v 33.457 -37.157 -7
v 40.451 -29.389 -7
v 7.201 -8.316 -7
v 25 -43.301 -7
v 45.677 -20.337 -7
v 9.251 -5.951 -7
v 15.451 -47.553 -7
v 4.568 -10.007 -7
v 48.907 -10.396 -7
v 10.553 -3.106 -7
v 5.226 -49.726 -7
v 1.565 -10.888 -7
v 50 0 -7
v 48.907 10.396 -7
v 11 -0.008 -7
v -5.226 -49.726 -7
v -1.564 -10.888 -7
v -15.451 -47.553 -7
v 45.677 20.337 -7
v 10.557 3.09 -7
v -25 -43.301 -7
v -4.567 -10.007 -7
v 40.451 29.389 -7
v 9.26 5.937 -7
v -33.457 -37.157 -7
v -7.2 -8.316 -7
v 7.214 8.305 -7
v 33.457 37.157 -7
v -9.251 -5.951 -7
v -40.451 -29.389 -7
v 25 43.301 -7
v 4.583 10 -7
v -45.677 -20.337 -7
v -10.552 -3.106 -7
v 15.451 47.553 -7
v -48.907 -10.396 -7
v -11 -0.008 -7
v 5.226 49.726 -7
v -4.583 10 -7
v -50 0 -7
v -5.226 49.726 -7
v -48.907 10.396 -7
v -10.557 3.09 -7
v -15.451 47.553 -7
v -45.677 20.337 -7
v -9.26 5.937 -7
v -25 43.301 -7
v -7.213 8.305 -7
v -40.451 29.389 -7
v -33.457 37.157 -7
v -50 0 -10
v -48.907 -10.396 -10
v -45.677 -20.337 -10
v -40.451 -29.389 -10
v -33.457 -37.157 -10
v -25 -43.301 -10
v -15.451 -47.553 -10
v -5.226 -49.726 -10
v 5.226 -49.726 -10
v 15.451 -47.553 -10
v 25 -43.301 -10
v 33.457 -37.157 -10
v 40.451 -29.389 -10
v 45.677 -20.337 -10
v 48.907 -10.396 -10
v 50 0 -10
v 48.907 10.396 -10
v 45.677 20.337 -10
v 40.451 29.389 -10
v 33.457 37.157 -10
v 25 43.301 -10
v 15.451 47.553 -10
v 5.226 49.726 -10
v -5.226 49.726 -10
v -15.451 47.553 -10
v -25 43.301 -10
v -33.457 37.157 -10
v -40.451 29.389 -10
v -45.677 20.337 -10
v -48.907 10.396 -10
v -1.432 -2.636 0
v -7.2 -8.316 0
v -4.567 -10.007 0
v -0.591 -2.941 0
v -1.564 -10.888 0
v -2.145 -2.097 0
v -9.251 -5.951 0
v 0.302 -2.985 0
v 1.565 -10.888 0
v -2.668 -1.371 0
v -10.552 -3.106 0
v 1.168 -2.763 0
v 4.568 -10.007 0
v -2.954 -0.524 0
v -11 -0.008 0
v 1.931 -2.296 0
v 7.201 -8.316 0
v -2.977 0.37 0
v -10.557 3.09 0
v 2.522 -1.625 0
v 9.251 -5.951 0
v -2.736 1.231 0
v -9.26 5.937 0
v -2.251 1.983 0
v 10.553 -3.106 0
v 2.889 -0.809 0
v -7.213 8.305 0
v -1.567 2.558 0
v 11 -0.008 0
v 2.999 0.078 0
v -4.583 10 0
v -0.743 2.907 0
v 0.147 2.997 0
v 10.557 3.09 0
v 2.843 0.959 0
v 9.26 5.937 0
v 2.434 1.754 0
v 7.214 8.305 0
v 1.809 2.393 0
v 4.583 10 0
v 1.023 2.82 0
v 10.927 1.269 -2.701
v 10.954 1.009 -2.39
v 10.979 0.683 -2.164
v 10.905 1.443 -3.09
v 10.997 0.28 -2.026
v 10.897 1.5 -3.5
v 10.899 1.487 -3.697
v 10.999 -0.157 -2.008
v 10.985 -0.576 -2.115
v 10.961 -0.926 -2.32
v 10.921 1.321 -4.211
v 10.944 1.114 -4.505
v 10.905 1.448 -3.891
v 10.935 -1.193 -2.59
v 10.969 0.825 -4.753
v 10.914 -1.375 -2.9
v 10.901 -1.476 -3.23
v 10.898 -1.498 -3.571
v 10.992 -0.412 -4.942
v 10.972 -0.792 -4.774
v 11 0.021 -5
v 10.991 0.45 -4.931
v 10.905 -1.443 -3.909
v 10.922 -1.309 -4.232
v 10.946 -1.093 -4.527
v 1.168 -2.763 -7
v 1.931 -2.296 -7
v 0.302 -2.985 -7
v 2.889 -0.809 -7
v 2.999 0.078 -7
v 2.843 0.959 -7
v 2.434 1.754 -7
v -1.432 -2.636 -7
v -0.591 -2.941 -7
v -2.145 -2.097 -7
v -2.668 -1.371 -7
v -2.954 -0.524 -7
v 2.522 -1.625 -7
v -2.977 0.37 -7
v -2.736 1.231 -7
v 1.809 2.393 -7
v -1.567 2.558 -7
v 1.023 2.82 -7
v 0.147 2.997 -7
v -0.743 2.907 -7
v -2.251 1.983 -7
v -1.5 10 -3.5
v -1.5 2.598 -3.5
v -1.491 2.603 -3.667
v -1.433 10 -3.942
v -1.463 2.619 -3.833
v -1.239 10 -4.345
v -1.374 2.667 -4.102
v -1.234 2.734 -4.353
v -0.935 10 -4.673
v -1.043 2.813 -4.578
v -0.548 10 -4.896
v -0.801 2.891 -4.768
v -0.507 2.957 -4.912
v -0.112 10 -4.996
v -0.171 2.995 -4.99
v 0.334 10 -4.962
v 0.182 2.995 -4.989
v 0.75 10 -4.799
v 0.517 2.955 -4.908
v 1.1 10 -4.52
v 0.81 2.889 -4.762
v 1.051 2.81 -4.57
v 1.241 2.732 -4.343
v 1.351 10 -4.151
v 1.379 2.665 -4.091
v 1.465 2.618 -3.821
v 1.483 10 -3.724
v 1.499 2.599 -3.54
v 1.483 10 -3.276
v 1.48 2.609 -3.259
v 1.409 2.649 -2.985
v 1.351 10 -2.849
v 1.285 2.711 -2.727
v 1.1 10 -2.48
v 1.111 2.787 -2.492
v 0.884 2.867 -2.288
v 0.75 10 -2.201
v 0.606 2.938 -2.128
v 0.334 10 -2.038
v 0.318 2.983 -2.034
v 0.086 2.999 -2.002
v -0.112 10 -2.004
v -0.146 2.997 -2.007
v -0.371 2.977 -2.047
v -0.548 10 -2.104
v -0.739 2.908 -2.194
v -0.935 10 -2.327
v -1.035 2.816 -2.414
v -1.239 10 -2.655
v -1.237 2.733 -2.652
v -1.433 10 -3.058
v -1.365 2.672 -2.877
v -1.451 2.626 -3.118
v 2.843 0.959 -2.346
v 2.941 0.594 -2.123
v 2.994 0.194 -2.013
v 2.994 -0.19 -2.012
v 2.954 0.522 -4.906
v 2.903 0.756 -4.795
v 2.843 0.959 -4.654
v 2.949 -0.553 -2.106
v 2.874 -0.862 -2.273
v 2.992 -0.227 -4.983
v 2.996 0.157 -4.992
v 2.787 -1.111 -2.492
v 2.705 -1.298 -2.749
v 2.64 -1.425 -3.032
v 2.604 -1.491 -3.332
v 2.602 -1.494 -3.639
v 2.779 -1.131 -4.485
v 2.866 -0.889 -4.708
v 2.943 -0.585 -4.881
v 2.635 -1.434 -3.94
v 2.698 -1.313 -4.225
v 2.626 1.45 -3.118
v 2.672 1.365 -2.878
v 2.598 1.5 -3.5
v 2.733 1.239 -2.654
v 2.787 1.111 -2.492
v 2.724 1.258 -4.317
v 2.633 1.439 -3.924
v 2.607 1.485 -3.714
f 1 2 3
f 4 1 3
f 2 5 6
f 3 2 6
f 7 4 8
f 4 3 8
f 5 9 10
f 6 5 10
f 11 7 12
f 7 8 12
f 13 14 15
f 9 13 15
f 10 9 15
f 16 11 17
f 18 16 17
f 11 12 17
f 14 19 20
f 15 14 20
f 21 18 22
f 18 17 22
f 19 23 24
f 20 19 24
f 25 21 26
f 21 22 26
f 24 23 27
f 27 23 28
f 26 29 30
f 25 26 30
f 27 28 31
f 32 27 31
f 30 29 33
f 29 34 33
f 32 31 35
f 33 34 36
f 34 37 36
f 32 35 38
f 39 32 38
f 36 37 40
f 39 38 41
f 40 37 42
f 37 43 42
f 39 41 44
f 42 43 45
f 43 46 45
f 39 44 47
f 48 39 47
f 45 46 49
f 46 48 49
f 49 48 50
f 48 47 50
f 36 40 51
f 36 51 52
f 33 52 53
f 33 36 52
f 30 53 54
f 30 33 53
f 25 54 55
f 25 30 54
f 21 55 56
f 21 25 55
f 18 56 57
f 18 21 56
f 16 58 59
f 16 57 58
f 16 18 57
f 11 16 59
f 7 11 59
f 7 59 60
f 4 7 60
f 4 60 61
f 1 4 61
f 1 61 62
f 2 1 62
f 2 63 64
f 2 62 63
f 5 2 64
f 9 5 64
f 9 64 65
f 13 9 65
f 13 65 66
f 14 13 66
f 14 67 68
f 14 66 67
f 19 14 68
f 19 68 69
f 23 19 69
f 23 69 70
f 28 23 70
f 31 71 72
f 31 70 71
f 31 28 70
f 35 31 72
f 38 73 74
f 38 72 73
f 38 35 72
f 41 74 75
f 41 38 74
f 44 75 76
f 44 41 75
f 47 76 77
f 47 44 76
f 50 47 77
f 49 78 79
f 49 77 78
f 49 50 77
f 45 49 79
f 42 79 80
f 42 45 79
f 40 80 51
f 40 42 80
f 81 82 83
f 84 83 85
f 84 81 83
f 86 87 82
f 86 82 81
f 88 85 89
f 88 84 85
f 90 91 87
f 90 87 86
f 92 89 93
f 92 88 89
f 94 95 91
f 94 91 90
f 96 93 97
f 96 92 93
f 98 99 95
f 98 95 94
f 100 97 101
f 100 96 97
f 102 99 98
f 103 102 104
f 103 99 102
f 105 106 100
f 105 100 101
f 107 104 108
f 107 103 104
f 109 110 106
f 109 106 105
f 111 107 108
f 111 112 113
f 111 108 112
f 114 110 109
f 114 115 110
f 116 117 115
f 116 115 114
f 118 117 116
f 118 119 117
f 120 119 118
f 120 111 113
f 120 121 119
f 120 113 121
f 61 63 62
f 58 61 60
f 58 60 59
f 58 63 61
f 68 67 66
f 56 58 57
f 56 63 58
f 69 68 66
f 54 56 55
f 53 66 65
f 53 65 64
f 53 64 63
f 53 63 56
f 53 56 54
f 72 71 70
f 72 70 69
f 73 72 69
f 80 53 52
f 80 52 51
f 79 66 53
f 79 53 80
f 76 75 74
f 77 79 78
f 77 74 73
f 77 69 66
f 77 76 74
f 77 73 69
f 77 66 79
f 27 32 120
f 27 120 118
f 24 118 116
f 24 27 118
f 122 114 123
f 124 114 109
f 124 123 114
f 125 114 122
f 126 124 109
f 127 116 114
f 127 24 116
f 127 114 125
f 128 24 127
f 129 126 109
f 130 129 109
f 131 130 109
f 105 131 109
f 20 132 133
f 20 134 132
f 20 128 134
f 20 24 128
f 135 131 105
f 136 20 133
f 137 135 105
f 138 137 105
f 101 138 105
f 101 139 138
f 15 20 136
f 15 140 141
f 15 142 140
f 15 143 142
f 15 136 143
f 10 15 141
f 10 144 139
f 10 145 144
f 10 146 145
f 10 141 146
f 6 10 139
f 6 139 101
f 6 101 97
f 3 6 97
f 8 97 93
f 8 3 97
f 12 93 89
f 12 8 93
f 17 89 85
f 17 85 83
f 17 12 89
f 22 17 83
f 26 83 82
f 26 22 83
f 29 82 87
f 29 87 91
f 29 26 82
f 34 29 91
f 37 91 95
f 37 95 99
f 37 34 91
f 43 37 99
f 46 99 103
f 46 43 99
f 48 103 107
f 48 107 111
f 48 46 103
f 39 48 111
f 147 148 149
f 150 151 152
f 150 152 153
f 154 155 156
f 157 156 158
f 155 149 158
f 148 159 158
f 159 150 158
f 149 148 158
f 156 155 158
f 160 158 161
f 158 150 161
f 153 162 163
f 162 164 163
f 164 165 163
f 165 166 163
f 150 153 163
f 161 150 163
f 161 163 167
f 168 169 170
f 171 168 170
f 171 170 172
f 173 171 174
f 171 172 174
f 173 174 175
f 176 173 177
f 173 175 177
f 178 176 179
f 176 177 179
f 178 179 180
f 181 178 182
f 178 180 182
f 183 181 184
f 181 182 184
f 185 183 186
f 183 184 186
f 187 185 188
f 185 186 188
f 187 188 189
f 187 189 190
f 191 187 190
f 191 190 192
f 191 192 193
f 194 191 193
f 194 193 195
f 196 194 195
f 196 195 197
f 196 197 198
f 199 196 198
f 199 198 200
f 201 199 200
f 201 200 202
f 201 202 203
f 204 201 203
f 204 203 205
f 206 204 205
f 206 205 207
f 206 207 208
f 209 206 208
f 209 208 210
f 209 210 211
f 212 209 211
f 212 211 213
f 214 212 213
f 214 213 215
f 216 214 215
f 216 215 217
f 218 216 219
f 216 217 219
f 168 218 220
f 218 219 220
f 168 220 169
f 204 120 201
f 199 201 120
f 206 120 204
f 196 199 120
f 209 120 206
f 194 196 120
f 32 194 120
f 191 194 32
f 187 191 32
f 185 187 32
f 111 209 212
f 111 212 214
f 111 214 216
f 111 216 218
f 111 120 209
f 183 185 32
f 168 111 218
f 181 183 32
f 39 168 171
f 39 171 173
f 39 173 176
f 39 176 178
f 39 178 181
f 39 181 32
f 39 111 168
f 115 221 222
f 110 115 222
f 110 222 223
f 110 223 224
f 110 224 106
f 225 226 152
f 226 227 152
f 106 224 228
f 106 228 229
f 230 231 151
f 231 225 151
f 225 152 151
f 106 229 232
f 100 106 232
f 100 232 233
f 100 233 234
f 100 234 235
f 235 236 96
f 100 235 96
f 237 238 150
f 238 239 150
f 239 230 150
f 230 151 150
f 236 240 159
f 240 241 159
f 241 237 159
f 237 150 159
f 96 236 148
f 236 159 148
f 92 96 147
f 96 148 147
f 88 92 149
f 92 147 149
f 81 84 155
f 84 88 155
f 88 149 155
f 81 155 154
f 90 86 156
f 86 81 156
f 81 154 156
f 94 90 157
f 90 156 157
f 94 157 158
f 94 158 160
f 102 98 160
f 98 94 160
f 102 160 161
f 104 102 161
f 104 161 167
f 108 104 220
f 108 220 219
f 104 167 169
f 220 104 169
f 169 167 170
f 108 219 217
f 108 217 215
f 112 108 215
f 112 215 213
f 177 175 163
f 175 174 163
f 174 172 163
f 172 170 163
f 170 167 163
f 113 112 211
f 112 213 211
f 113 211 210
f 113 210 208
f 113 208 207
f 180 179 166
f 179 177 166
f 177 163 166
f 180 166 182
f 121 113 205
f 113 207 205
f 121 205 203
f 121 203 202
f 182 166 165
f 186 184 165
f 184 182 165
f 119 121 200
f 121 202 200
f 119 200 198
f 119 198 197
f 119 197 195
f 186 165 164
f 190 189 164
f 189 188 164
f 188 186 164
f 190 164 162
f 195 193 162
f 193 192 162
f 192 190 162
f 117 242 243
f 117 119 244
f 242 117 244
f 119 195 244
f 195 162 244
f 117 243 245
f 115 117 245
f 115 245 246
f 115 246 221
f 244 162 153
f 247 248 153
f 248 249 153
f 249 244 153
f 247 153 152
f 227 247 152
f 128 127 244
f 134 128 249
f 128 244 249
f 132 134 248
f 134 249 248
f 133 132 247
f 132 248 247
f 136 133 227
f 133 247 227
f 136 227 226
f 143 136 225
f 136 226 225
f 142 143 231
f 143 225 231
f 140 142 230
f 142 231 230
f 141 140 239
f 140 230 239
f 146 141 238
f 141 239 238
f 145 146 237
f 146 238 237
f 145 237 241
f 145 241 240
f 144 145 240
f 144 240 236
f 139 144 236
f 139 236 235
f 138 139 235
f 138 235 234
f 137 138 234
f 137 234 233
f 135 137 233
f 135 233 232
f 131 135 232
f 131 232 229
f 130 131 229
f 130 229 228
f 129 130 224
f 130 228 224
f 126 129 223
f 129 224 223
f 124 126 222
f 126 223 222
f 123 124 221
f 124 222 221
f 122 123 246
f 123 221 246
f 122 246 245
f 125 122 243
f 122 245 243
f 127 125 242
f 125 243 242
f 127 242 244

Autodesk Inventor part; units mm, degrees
ref_plane "YZ Plane" through (0, 0, 0) normal (1, 0, 0) x (0, 1, 0)
ref_plane "XZ Plane" through (0, 0, 0) normal (0, 1, 0) x (-1, 0, 0)
ref_plane "XY Plane" through (0, 0, 0) normal (0, 0, 1) x (1, 0, 0)
sketch "Sketch1" plane through (0, 0, 0) normal (0, 0, 1) x (1, 0, 0)
  spline S0 degree 3 poles (-8.9262, 55.5372) (-8.7839, 55.3802) (-8.4991, 55.0662) (-8.0852, 54.5835) (-7.6813, 54.0924) (-7.2889, 53.592) (-6.9084, 53.0826) (-6.5406, 52.5638) (-6.1865, 52.0357) (-5.8469, 51.4981) (-5.5231, 50.9508) (-5.2164, 50.3937) (-4.9286, 49.8267) (-4.6617, 49.2495) (-4.4187, 48.6617) (-4.2033, 48.0633) (-4.0539, 47.5547) (-3.9553, 47.1422) (-3.9241, 46.9325) (-3.9085, 46.8277) knots 0 0 0 0 0.063581 0.127162 0.190743 0.254324 0.317905 0.381486 0.445066 0.508647 0.572227 0.635807 0.699386 0.762964 0.826542 0.890117 0.953687 0.985476 1.017256 1.017256 1.017256 1.017256
  spline S1 degree 3 poles (-3.9085, 46.8277) (-3.8988, 46.6849) (-3.8795, 46.3993) (-3.8286, 45.9728) (-3.7545, 45.5498) (-3.6583, 45.1311) (-3.5319, 44.7205) (-3.3763, 44.3201) (-3.189, 43.9333) (-2.9645, 43.5666) (-2.7433, 43.2845) (-2.5493, 43.0739) (-2.3922, 42.9274) (-2.2262, 42.7911) (-2.0526, 42.6646) (-1.8686, 42.5537) (-1.678, 42.4548) (-1.4812, 42.3683) (-1.2769, 42.302) (-1.0697, 42.2449) (-0.8577, 42.21) (-0.6441, 42.187) (-0.3577, 42.1846) (0, 42.1894) (0.3577, 42.1846) (0.6441, 42.187) (0.8577, 42.21) (1.0697, 42.2449) (1.2769, 42.302) (1.4812, 42.3683) (1.678, 42.4548) (1.8686, 42.5537) (2.0526, 42.6646) (2.2262, 42.7911) (2.3922, 42.9274) (2.5493, 43.0739) (2.7433, 43.2845) (2.9645, 43.5666) (3.189, 43.9333) (3.3763, 44.3201) (3.5319, 44.7205) (3.6583, 45.1311) (3.7545, 45.5498) (3.8286, 45.9728) (3.8795, 46.3993) (3.8988, 46.6849) (3.9085, 46.8277) knots 0 0 0 0 0.04293 0.085861 0.12879 0.17172 0.214646 0.257562 0.300476 0.343394 0.386302 0.407769 0.429238 0.450698 0.472163 0.49363 0.515088 0.536554 0.558017 0.579478 0.600945 0.622403 0.64387 0.686802 0.729734 0.751201 0.772659 0.794126 0.815587 0.83705 0.858516 0.879974 0.901441 0.922906 0.944366 0.965835 0.987302 1.03021 1.073128 1.116042 1.158958 1.201884 1.244814 1.287743 1.330674 1.373604 1.373604 1.373604 1.373604
  spline S2 degree 3 poles (3.9085, 46.8277) (3.9241, 46.9325) (3.9553, 47.1422) (4.0539, 47.5547) (4.2033, 48.0633) (4.4187, 48.6617) (4.6617, 49.2495) (4.9286, 49.8267) (5.2164, 50.3937) (5.5231, 50.9508) (5.8469, 51.4981) (6.1865, 52.0357) (6.5406, 52.5638) (6.9084, 53.0826) (7.2889, 53.592) (7.6813, 54.0924) (8.0852, 54.5835) (8.4991, 55.0662) (8.7839, 55.3802) (8.9262, 55.5372) knots 0 0 0 0 0.03178 0.063568 0.127139 0.190714 0.254291 0.31787 0.381449 0.445029 0.508609 0.572189 0.63577 0.699351 0.762932 0.826513 0.890094 0.953675 1.017256 1.017256 1.017256 1.017256
  circle A0 centre (0, 0) radius 42.1875 construction
  circle A1 centre (0, 0) radius 46.9846 construction
  circle A2 centre (0, 0) radius 50 construction
  circle A3 centre (0, 0) radius 56.25
  point P0 (-8.5013, 55.0643)
  point P1 (-8.0869, 54.5821)
  point P2 (-7.6832, 54.0908)
  point P3 (-7.2909, 53.5905)
  point P4 (-6.9105, 53.081)
  point P5 (-6.5429, 52.5623)
  point P6 (-6.1889, 52.0341)
  point P7 (-5.8496, 51.4965)
  point P8 (-5.526, 50.9492)
  point P9 (-5.2196, 50.3921)
  point P10 (-4.9321, 49.825)
  point P11 (-4.6657, 49.2477)
  point P12 (-4.4233, 48.6599)
  point P13 (-4.2093, 48.0613)
  point P14 (-4.031, 47.4511)
  point P15 (-3.9598, 47.1413)
  point P16 (-3.8758, 46.3996)
  point P17 (-3.8247, 45.9733)
  point P18 (-3.7508, 45.5505)
  point P19 (-3.6533, 45.1324)
  point P20 (-3.527, 44.7221)
  point P21 (-3.371, 44.3223)
  point P22 (-3.1828, 43.9367)
  point P23 (-2.9576, 43.5713)
  point P24 (-2.6935, 43.2332)
  point P25 (-2.5474, 43.0758)
  point P26 (-2.3907, 42.9291)
  point P27 (-2.225, 42.7928)
  point P28 (-2.0509, 42.6672)
  point P29 (-1.8675, 42.5557)
  point P30 (-1.677, 42.4569)
  point P31 (-1.48, 42.3717)
  point P32 (-1.2764, 42.3036)
  point P33 (-1.069, 42.2486)
  point P34 (-0.8574, 42.212)
  point P35 (-0.6439, 42.1905)
  point P36 (-0.4293, 42.1857)
  point P37 (0, 42.1875)
  point P38 (0.4293, 42.1857)
  point P39 (0.6439, 42.1905)
  point P40 (0.8574, 42.212)
  point P41 (1.069, 42.2486)
  point P42 (1.2764, 42.3036)
  point P43 (1.48, 42.3717)
  point P44 (1.677, 42.4569)
  point P45 (1.8675, 42.5557)
  point P46 (2.0509, 42.6672)
  point P47 (2.225, 42.7928)
  point P48 (2.3907, 42.9291)
  point P49 (2.5474, 43.0758)
  point P50 (2.6935, 43.2332)
  point P51 (2.9576, 43.5713)
  point P52 (3.1828, 43.9367)
  point P53 (3.371, 44.3223)
  point P54 (3.527, 44.7221)
  point P55 (3.6533, 45.1324)
  point P56 (3.7508, 45.5505)
  point P57 (3.8247, 45.9733)
  point P58 (3.8758, 46.3996)
  point P59 (3.9598, 47.1413)
  point P60 (4.031, 47.4511)
  point P61 (4.2093, 48.0613)
  point P62 (4.4233, 48.6599)
  point P63 (4.6657, 49.2477)
  point P64 (4.9321, 49.825)
  point P65 (5.2196, 50.3921)
  point P66 (5.526, 50.9492)
  point P67 (5.8496, 51.4965)
  point P68 (6.1889, 52.0341)
  point P69 (6.5429, 52.5623)
  point P70 (6.9105, 53.081)
  point P71 (7.2909, 53.5905)
  point P72 (7.6832, 54.0908)
  point P73 (8.0869, 54.5821)
  point P74 (8.5013, 55.0643)
extrude "Extrusion1" add sketch "Sketch1" against normal blind 16
extrude "Extrusion2" cut sketch "Sketch1" against normal through all contours A3 S2 S1 S0 picked at (0.9155, 51.5438)
pattern_circular "Circular Pattern1" count 16 over 360 about axis through (0, 0, 0) along (0, 0, -1) of "Extrusion2"
sketch "Measuring" plane through (0, 0, -16) normal (0, 0, -1) x (-1, 0, 0)
  circle A0 centre (0, 0) radius 56.25 projected
  circle A1 centre (0, 0) radius 50
  circle A2 centre (73.063, 68.2774) radius 50 construction
  line L0 (27.9744, 52.4494) -> (54.2214, 24.3627) construction
  line L1 (41.0979, 38.406) -> (73.063, 68.2774) construction
  dimension "d37" = 100
  dimension "d45" = 6.25
  dimension "d46" = 100
  dimension "d47" = 43.75
sketch "Sketch11" plane through (0, 0, 0) normal (1, 0, 0) x (0, 1, 0)
  line L0 (13.8864, 0) -> (-13.8864, 0) construction
  line L1 (-13.8864, 0) -> (-13.8864, -7) construction
  line L2 (-13.8864, -7) -> (13.8864, -7) construction
  line L3 (13.8864, -7) -> (13.8864, 0) construction
  circle A0 centre (0, -3.5) radius 1.5 construction
  line L4 (-1.3941, -2) -> (1.3941, -2) construction
  line L5 (-3.9085, -16) -> (3.9085, -16) construction
  line L6 (-67.1444, 3.8787) -> (73.9482, 3.8787)
  line L7 (73.9482, 3.8787) -> (73.9482, -7)
  line L8 (73.9482, -7) -> (-67.1444, -7)
  line L9 (-67.1444, -7) -> (-67.1444, 3.8787)
  point P0 (0, 0)
  point P1 (0, 0)
  point P2 (-13.8864, -3.5)
  point P3 (0, -2)
  dimension "d48" = 3
  dimension "d49" = 2
  dimension "d50" = 9
  dimension "d58" = 7
extrude "Thinner" cut sketch "Sketch11" against normal through all both and the other way through all
sketch "Sketch12" plane through (-16.8651, 41.399, -7) normal (0, 0, 1) x (0.9476, 0.3195, 0)
  circle A0 centre (2.7546, -44.6175) radius 3
  dimension "d54" = 6
extrude "Hole" cut sketch "Sketch12" against normal blind 20
sketch "Sketch13" plane through (-16.8651, 41.399, -7) normal (0, 0, 1) x (0.9476, 0.3195, 0)
  circle A0 centre (2.7546, -44.6175) radius 11
  circle A1 centre (2.7546, -44.6175) radius 3 projected
  dimension "d57" = 8
extrude "Coupler" add sketch "Sketch13" along normal blind 7
sketch "Sketch14" plane through (-16.8651, 41.399, -7) normal (0, 0, 1) x (0.9476, 0.3195, 0)
  circle A0 centre (11.251, -19.4175) radius 9
  line L0 (16.2331, -4.641) -> (2.7546, -44.6175) construction
  circle A1 centre (2.7546, -44.6175) radius 11 construction
  circle A2 centre (2.7546, -44.6175) radius 11 construction
  line L1 (6.269, -34.194) -> (16.2331, -4.641) construction
  circle A3 centre (-14.821, -24.6594) radius 9
  circle A4 centre (-23.3174, -49.8593) radius 9
  circle A5 centre (-5.7418, -69.8174) radius 9
  circle A6 centre (20.3302, -64.5756) radius 9
  circle A7 centre (28.8266, -39.3756) radius 9
  dimension "d61" = 18
  dimension "d64" = 360
extrude "Cutouts" cut sketch "Sketch14" against normal through all
sketch "Sketch15" plane through (0, 0, 0) normal (1, 0, 0) x (0, 1, 0)
  circle A0 centre (0, -3.5) radius 1.5
  line L0 (11, 0) -> (-11, 0) projected
  line L1 (0, 0) -> (0, -7) construction
  line L2 (0, -7) -> (0, 0) construction
  line L3 (-11, -7) -> (11, -7) construction
  point P0 (0, 0)
  point P1 (-10.9663, -7)
  dimension "d68" = 3
extrude "SetScrewHole1" cut sketch "Sketch15" along normal through all
sketch "Sketch16" plane through (0, 0, 0) normal (0, 1, 0) x (-1, 0, 0)
  circle A0 centre (0, -3.5) radius 1.5
  line L0 (-11, -7) -> (11, -7) projected
  line L1 (0, 0) -> (0, -7) construction
  dimension "d71" = 3
extrude "Extrusion14" cut sketch "Sketch16" along normal through all
thread "Thread3" size "M3x0.5" class "6H" standard "ANSI Metric M Profile" full length
thread "Thread4" size "M3x0.5" class "6H" standard "ANSI Metric M Profile" full length
sketch "Sketch17" plane through (-16.8651, 41.399, -7) normal (0, 0, 1) x (0.9476, 0.3195, 0)
  line L0 (-62.2572, 14.3784) -> (64.742, 14.3784)
  line L1 (64.742, 14.3784) -> (64.742, -104.7192)
  line L2 (64.742, -104.7192) -> (-62.2572, -104.7192)
  line L3 (-62.2572, -104.7192) -> (-62.2572, 14.3784)
  point P0 (2.7546, -44.6175)
extrude "Extrusion15" cut sketch "Sketch17" against normal blind 10
sketch "Sketch18" plane through (0, 0, -7) normal (0, 0, -1) x (-1, 0, 0)
  circle A0 centre (0, 0) radius 50
  dimension "d80" = 100
extrude "Extrusion16" add sketch "Sketch18" along normal blind 3
sketch "Sketch19" plane through (0, 0, -10) normal (0, 0, -1) x (-1, 0, 0)
  line L0 (-50, 50) -> (50, 50) construction
  line L1 (50, 50) -> (50, -50) construction
  line L2 (50, -50) -> (-50, -50) construction
  line L3 (-50, -50) -> (-50, 50) construction
  circle A0 centre (0, 0) radius 50 projected
sketch "Sketch20" plane through (0, 0, 0) normal (1, 0, 0) x (0, 1, 0)
  line L0 (-50, -7) -> (50, -7) projected
  line L1 (18.4735, 2.9106) -> (10, 2.9106)
  line L2 (10, 2.9106) -> (10, -7)
  line L3 (10, -7) -> (18.4735, -7)
  line L4 (18.4735, -7) -> (18.4735, 2.9106)
  point P0 (0, 0)
  dimension "d124" = 10
extrude "Extrusion17" cut sketch "Sketch20" along normal through all both and the other way through all
equation "\"Module\" = 6.25"
equation "\"PressureAngle\" = 20deg"
equation "\"UnitProfileClearance\" = 0.25"
equation "\"UnitRoundRadius\" = 0.35"
equation "\"HeadDiameter\" = 112.5"
equation "\"RootDiameter\" = 84.375"
equation "\"BaseDiameter\" = 93.96926"
equation "\"HelixAngle\" = 0"
equation "\"UnitCorrection\" = 0"
equation "\"UnitAddendumModification\" = 0"
equation "\"CircularPitch\" = 19.634954"
equation "\"UnitBacklashShift\" = 0"
equation "\"TotalToolShift\" = 0"
equation "\"IsInternal\" = 0"
properties part number "wheel"
